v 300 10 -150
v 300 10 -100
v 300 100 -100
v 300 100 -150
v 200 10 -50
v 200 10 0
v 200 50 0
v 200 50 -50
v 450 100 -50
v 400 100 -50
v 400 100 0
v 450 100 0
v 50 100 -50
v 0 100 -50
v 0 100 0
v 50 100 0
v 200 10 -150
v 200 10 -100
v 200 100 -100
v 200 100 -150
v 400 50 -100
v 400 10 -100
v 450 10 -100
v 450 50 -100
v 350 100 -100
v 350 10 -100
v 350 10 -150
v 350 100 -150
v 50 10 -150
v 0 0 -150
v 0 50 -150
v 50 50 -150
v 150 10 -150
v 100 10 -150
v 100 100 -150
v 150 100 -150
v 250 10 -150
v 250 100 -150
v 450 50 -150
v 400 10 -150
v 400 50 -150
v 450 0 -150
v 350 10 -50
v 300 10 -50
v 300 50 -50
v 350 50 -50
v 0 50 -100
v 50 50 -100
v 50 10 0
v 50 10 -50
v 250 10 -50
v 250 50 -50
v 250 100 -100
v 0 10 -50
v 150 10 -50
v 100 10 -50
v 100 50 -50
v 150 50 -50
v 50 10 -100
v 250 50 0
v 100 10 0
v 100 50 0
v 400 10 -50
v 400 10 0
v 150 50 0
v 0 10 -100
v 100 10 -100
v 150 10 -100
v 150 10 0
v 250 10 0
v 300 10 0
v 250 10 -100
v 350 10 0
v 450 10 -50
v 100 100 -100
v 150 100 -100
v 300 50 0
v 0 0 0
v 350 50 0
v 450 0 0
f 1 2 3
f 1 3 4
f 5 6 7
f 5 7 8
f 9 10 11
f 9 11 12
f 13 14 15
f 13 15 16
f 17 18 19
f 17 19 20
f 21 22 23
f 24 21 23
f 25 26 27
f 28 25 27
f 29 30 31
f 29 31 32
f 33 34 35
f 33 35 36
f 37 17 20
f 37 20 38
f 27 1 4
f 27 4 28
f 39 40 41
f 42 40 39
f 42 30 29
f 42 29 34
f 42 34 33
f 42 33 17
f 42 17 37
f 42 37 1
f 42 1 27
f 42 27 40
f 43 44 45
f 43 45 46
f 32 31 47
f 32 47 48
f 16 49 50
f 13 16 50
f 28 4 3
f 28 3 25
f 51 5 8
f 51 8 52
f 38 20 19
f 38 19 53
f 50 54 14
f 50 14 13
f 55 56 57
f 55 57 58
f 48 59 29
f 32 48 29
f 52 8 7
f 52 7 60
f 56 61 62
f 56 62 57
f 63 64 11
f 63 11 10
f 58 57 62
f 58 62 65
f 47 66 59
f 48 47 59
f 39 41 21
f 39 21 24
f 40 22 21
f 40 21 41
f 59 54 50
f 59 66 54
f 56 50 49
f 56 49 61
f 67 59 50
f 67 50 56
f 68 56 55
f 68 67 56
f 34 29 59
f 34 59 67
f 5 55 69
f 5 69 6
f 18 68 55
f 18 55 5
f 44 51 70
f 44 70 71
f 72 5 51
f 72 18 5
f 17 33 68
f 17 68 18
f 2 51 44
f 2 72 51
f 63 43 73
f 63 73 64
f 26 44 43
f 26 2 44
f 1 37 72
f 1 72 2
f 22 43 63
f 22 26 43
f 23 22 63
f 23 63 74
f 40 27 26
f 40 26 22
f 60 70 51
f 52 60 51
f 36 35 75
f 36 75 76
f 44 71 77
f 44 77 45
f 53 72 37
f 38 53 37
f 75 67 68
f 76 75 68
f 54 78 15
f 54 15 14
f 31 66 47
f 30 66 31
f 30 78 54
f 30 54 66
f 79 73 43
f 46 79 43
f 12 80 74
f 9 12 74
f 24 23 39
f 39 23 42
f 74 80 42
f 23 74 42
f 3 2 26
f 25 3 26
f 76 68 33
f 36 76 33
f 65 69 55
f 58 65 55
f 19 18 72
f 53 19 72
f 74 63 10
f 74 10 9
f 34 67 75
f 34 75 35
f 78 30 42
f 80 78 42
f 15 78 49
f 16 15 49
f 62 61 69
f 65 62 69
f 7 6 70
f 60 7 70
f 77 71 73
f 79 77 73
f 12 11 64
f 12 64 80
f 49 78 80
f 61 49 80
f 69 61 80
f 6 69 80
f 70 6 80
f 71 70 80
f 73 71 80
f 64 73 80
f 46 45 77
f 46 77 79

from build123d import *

# Parameters (mm, degrees)
BOSS_EXTRUDE3_DEPTH = 10
SKETCH2_5_W         = 50
SKETCH2_5_H         = 50
BOSS_EXTRUDE4_DEPTH = 100
SKETCH2_6_W         = 50
SKETCH2_6_H         = 50
BOSS_EXTRUDE5_DEPTH = 50


with BuildPart() as part:
    # Sketch2 → Boss-Extrude3 (new body)
    with BuildSketch(Plane(origin=(0, 0, 0), x_dir=(1, 0, 0), z_dir=(0, 1, 0))):
        Polygon((100, 100), (100, 150), (50, 150), (50, 100), (0, 100), (0, 50), (50, 50), (50, 0), (100, 0), (100, 50), (150, 50), (150, 0), (200, 0), (200, 50), (250, 50), (250, 0), (300, 0), (300, 50), (350, 50), (350, 0), (400, 0), (400, 50), (450, 50), (450, 100), (400, 100), (400, 150), (350, 150), (350, 100), (300, 100), (300, 150), (250, 150), (250, 100), (200, 100), (200, 150), (150, 150), (150, 100), align=None)
    extrude(amount=BOSS_EXTRUDE3_DEPTH)

    # Sketch2<5> → Boss-Extrude4 (add)
    with BuildSketch(Plane(origin=(0, 0, 0), x_dir=(1, 0, 0), z_dir=(0, 1, 0))):
        with Locations((125, 125)):
            Rectangle(SKETCH2_5_W, SKETCH2_5_H)
        with Locations((225, 125)):
            Rectangle(SKETCH2_5_W, SKETCH2_5_H)
        with Locations((325, 125)):
            Rectangle(SKETCH2_5_W, SKETCH2_5_H)
        with Locations((25, 25)):
            Rectangle(SKETCH2_5_W, SKETCH2_5_H)
        with Locations((425, 25)):
            Rectangle(SKETCH2_5_W, SKETCH2_5_H)
    extrude(amount=BOSS_EXTRUDE4_DEPTH)

    # Sketch2<6> → Boss-Extrude5 (add)
    with BuildSketch(Plane(origin=(0, 0, 0), x_dir=(1, 0, 0), z_dir=(0, 1, 0))):
        with Locations((25, 125)):
            Rectangle(SKETCH2_6_W, SKETCH2_6_H)
        with Locations((425, 125)):
            Rectangle(SKETCH2_6_W, SKETCH2_6_H)
        with Locations((125, 25)):
            Rectangle(SKETCH2_6_W, SKETCH2_6_H)
        with Locations((225, 25)):
            Rectangle(SKETCH2_6_W, SKETCH2_6_H)
        with Locations((325, 25)):
            Rectangle(SKETCH2_6_W, SKETCH2_6_H)
    extrude(amount=BOSS_EXTRUDE5_DEPTH)


solid = part.part
